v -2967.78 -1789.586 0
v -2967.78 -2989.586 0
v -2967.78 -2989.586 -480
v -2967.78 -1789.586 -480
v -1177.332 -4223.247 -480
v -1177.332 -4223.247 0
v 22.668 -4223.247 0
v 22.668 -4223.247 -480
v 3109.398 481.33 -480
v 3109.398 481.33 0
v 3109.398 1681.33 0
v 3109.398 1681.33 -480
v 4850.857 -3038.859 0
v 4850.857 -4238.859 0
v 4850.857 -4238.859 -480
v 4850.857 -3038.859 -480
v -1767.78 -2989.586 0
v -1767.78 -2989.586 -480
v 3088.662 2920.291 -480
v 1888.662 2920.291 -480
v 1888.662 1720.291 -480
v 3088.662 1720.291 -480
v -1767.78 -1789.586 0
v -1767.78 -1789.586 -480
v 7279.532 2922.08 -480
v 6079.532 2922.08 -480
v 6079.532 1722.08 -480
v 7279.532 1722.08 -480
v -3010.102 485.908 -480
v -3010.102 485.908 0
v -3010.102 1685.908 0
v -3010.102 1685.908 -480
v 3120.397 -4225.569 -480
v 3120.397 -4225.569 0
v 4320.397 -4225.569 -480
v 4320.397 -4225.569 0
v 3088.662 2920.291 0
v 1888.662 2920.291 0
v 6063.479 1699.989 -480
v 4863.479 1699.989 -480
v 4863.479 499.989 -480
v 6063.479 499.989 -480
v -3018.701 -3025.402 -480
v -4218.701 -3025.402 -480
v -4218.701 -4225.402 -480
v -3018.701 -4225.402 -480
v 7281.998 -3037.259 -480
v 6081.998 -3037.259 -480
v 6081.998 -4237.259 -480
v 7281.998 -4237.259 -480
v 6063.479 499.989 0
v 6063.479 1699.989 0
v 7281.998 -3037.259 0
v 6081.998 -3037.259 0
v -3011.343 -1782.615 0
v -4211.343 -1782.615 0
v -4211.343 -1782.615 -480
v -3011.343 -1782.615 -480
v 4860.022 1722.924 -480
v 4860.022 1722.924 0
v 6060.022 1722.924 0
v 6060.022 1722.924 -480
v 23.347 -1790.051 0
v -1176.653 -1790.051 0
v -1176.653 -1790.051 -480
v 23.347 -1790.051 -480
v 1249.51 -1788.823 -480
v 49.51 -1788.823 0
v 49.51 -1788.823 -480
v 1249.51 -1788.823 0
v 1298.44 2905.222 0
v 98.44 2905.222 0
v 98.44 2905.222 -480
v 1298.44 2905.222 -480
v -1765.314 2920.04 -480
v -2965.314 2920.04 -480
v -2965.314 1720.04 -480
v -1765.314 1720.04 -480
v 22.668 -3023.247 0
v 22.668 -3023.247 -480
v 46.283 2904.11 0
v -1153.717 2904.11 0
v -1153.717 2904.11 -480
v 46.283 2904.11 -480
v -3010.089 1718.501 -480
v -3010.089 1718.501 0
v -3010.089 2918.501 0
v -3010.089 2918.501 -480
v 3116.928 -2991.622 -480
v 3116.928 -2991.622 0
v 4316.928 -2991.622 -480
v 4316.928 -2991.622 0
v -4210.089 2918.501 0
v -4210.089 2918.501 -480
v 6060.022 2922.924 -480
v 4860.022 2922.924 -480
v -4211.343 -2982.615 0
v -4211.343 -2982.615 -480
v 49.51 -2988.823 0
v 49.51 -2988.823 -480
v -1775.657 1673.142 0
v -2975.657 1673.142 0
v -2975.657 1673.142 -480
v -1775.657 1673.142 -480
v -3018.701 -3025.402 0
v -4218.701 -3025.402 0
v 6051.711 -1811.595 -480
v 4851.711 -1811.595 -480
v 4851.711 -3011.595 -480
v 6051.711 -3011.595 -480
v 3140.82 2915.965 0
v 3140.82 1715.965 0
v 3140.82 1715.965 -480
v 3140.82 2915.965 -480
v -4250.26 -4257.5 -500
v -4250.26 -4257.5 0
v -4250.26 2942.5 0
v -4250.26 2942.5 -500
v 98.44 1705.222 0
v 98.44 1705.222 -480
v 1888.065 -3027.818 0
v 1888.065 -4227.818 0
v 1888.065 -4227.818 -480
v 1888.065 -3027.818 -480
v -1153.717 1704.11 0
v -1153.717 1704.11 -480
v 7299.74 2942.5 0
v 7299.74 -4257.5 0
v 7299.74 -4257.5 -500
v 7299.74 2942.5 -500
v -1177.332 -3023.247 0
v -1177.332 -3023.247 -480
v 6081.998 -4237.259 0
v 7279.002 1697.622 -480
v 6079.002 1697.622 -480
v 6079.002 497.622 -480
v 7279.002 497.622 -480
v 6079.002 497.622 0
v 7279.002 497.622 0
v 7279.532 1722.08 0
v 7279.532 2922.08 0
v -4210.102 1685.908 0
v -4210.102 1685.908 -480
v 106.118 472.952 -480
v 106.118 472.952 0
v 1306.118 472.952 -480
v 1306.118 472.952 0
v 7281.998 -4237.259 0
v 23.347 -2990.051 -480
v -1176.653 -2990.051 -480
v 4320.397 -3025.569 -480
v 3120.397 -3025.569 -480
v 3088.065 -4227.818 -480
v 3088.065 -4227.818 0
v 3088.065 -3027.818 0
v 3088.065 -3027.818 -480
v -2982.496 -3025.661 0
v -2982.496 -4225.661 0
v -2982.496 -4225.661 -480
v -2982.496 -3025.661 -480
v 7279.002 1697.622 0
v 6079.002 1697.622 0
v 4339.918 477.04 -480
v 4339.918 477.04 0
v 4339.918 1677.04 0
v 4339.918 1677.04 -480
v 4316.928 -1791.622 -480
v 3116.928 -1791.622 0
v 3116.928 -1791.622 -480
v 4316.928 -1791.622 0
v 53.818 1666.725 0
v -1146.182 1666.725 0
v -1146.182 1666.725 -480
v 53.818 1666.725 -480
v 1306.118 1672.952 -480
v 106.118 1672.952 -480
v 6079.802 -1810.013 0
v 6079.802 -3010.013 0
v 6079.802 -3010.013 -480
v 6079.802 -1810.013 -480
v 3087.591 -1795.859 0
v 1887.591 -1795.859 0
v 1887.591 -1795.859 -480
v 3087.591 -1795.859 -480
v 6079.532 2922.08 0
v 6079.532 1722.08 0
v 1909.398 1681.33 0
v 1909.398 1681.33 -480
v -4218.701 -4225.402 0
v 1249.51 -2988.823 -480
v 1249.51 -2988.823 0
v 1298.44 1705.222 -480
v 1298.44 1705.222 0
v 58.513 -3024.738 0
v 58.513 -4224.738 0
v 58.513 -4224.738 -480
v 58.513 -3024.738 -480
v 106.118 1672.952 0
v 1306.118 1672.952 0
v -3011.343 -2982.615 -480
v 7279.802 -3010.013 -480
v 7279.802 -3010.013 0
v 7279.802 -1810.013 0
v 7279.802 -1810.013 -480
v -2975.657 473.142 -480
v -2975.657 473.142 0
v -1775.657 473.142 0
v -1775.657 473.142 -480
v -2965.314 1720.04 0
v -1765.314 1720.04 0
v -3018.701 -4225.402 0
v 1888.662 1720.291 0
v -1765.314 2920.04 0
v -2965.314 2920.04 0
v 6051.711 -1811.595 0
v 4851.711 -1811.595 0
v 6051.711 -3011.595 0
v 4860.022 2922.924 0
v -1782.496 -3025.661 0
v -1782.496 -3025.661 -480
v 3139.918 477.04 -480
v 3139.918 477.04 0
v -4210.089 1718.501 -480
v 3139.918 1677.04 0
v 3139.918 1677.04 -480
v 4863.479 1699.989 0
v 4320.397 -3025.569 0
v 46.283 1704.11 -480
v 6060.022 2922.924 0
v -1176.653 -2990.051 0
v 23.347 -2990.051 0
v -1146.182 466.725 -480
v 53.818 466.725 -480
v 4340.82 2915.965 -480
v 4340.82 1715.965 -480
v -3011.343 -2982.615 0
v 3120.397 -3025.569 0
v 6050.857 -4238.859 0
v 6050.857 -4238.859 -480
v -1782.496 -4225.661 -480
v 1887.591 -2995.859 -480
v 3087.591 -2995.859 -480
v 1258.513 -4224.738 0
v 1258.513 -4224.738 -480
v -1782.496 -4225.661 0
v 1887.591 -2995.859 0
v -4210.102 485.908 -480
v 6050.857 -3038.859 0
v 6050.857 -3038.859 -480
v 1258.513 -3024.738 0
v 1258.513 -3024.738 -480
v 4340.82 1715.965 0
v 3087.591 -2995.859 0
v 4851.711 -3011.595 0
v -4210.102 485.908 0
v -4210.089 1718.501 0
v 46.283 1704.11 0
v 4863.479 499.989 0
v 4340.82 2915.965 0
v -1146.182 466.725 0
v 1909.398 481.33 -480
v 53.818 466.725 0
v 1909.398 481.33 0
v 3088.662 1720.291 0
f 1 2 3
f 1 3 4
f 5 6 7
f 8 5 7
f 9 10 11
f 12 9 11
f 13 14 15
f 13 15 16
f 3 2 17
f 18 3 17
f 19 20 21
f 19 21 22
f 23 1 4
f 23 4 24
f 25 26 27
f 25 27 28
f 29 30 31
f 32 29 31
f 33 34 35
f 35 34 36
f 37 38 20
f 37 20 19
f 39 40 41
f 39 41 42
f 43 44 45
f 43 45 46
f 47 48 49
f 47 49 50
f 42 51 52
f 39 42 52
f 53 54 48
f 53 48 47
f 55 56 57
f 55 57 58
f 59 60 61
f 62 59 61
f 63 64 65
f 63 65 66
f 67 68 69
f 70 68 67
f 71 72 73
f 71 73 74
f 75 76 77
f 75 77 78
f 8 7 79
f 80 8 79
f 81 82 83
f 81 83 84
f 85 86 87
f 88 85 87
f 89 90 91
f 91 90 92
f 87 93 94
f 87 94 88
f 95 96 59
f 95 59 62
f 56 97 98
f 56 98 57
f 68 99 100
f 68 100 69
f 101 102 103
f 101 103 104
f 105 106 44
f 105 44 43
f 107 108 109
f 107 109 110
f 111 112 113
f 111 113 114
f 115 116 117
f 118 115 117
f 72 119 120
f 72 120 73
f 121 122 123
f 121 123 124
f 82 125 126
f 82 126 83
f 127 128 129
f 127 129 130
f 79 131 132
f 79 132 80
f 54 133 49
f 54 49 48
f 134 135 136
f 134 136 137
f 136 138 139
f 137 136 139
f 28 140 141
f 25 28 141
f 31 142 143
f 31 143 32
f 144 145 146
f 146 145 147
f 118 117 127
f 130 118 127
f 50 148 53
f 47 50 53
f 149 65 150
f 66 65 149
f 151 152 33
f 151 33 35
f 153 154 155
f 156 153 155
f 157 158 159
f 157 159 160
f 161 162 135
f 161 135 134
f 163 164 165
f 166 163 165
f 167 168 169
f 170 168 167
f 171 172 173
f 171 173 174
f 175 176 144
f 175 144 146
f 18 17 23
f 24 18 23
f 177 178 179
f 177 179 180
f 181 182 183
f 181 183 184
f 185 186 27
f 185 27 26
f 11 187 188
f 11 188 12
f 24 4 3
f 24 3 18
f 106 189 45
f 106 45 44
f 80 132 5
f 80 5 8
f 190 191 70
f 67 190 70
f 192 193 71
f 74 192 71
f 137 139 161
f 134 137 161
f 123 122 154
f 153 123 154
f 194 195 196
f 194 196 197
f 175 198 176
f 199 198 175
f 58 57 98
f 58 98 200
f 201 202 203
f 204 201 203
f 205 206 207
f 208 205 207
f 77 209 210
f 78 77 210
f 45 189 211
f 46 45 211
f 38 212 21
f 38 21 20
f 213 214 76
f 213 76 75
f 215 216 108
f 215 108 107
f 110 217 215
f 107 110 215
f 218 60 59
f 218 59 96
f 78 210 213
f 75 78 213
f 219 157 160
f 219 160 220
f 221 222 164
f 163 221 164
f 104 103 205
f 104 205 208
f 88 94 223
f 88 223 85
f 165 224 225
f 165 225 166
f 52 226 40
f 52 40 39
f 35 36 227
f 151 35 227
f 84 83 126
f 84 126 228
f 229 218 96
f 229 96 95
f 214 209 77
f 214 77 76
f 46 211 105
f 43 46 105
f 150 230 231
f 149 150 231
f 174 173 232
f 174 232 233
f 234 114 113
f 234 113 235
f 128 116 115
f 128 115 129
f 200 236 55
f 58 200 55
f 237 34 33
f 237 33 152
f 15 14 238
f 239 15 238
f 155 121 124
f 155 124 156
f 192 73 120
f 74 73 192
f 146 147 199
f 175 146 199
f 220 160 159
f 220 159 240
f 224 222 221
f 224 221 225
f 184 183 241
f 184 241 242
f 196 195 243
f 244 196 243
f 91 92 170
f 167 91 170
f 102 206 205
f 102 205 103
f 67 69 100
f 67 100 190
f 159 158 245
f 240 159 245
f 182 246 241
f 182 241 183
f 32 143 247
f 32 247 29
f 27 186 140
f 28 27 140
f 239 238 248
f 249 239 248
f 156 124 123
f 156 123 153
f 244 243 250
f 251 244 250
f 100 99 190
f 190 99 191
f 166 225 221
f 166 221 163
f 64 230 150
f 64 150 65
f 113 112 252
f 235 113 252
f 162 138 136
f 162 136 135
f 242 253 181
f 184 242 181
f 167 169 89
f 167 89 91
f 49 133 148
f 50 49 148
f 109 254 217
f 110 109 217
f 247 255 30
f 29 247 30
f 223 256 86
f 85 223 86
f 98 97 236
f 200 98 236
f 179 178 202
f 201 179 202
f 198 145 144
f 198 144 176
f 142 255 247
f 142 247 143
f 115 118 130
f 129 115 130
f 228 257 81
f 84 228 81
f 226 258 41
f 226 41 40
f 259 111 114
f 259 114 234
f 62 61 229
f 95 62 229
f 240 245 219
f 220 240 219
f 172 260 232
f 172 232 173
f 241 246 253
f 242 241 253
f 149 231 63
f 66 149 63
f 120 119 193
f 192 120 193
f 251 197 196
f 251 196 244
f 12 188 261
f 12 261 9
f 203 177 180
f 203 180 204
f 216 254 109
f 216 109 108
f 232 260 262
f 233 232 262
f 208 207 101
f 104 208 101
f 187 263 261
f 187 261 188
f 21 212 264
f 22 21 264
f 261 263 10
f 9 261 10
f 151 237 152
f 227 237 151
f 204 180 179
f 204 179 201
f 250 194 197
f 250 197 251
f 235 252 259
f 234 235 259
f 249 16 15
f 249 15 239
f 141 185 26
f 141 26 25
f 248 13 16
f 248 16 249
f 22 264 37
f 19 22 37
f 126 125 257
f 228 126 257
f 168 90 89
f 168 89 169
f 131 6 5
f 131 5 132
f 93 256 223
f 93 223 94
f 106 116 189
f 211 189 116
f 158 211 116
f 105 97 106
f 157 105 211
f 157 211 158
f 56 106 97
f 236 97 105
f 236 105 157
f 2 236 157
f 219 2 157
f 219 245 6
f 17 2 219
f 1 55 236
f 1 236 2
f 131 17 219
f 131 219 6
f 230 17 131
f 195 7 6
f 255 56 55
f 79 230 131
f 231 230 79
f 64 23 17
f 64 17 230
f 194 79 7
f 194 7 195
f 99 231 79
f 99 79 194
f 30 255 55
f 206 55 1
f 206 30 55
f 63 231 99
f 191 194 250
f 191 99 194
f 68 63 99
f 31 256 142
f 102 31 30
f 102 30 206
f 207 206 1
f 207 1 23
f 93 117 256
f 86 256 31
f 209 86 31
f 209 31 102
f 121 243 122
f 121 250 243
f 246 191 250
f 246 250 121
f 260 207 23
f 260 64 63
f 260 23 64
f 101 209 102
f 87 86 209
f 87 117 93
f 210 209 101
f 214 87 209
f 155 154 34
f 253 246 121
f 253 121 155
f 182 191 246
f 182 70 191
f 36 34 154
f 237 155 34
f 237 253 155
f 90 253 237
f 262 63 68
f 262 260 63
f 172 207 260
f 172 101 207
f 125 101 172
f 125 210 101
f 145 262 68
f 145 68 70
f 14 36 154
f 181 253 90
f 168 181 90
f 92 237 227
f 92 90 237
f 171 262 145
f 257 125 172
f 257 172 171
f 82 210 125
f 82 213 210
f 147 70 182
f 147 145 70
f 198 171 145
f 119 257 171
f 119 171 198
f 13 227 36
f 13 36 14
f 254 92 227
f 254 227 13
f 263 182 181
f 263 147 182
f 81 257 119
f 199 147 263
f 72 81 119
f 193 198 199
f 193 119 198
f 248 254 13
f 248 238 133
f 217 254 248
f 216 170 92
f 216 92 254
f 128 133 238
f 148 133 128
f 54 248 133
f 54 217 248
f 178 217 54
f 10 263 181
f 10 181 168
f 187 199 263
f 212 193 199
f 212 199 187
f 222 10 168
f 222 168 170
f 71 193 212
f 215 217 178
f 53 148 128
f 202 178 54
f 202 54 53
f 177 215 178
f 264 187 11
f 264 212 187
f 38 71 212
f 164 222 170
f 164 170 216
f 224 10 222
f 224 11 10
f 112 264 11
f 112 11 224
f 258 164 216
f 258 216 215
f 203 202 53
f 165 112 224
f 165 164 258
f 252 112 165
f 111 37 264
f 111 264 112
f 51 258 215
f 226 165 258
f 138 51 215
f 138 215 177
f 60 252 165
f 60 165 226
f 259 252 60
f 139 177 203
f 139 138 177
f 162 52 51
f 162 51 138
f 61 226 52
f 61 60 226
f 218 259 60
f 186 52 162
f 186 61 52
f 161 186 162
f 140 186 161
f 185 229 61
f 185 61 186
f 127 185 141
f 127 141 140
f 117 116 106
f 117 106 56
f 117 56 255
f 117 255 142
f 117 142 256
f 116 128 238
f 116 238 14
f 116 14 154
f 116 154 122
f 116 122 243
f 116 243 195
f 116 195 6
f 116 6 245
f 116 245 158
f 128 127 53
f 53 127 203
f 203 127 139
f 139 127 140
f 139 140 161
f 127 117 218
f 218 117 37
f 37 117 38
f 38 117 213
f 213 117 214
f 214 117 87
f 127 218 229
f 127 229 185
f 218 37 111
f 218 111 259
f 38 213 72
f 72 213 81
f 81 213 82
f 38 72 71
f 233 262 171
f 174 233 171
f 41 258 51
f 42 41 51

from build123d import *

# Parameters (mm, degrees)
F0_W      = 11550
F0_H      = 7200
F1_DEPTH  = 500
F2_W      = 1200
F2_H      = 1200
F3_DEPTH  = 480
F4_W      = 1200
F4_H      = 1200
F5_DEPTH  = 480
F6_W      = 1200
F6_H      = 1200
F7_DEPTH  = 480
F8_W      = 1200
F8_H      = 1200
F9_DEPTH  = 480
F10_W     = 1200
F10_H     = 1200
F11_DEPTH = 480
F12_W     = 1200
F12_H     = 1200
F13_DEPTH = 480
F14_W     = 1200
F14_H     = 1200
F15_DEPTH = 480
F16_W     = 1200
F16_H     = 1200
F17_DEPTH = 480
F18_W     = 1200
F18_H     = 1200
F19_DEPTH = 480
F20_W     = 1200
F20_H     = 1200
F21_DEPTH = 480
F22_W     = 1200
F22_H     = 1200
F23_DEPTH = 480
F24_W     = 1200
F24_H     = 1200
F25_DEPTH = 480
F26_W     = 1200
F26_H     = 1200
F27_DEPTH = 480
F28_W     = 1200
F28_H     = 1200
F29_DEPTH = 480
F30_W     = 1200
F30_H     = 1200
F31_DEPTH = 480
F32_W     = 1200
F32_H     = 1200
F33_DEPTH = 480
F34_W     = 1200
F34_H     = 1200
F35_DEPTH = 480
F36_W     = 1200
F36_H     = 1200
F37_DEPTH = 480
F38_W     = 1200
F38_H     = 1200
F39_DEPTH = 480
F40_W     = 1200
F40_H     = 1200
F41_DEPTH = 480
F42_W     = 1200
F42_H     = 1200
F43_DEPTH = 480
F44_W     = 1200
F44_H     = 1200
F45_DEPTH = 480
F46_W     = 1200
F46_H     = 1200
F47_DEPTH = 480
F48_W     = 1200
F48_H     = 1200
F49_DEPTH = 480
F50_W     = 1200
F50_H     = 1200
F51_DEPTH = 480
F52_W     = 1200
F52_H     = 1200
F53_DEPTH = 480
F54_W     = 1200
F54_H     = 1200
F55_DEPTH = 480
F56_W     = 1200
F56_H     = 1200
F57_DEPTH = 480
F58_W     = 1200
F58_H     = 1200
F59_DEPTH = 480
F60_W     = 1200
F60_H     = 1200
F61_DEPTH = 480
F62_W     = 1200
F62_H     = 1200
F63_DEPTH = 480
F64_W     = 1200
F64_H     = 1200
F65_DEPTH = 480


with BuildPart() as f1:
    # F0 (on Top) → F1 (new body)
    with BuildSketch(Plane.XY):
        with Locations((1524.740228, -657.499954)):
            Rectangle(F0_W, F0_H)
    extrude(amount=-F1_DEPTH)

    # F2 (on Top) → F3 (cut)
    with BuildSketch(Plane.XY):
        with Locations((-3610.088944, 2318.501111)):
            Rectangle(F2_W, F2_H)
    extrude(amount=-F3_DEPTH, mode=Mode.SUBTRACT)

    # F4 (on Top) → F5 (cut)
    with BuildSketch(Plane.XY):
        with Locations((-2365.314484, 2320.040209)):
            Rectangle(F4_W, F4_H)
    extrude(amount=-F5_DEPTH, mode=Mode.SUBTRACT)

    # F6 (on Top) → F7 (cut)
    with BuildSketch(Plane.XY):
        with Locations((-3610.101614, 1085.907519)):
            Rectangle(F6_W, F6_H)
    extrude(amount=-F7_DEPTH, mode=Mode.SUBTRACT)

    # F8 (on Top) → F9 (cut)
    with BuildSketch(Plane.XY):
        with Locations((-2375.65726, 1073.141722)):
            Rectangle(F8_W, F8_H)
    extrude(amount=-F9_DEPTH, mode=Mode.SUBTRACT)

    # F10 (on Top) → F11 (cut)
    with BuildSketch(Plane.XY):
        with Locations((-3618.7011, -3625.402108)):
            Rectangle(F10_W, F10_H)
    extrude(amount=-F11_DEPTH, mode=Mode.SUBTRACT)

    # F12 (on Top) → F13 (cut)
    with BuildSketch(Plane.XY):
        with Locations((-3611.342549, -2382.615124)):
            Rectangle(F12_W, F12_H)
    extrude(amount=-F13_DEPTH, mode=Mode.SUBTRACT)

    # F14 (on Top) → F15 (cut)
    with BuildSketch(Plane.XY):
        with Locations((-2367.779791, -2389.58588)):
            Rectangle(F14_W, F14_H)
    extrude(amount=-F15_DEPTH, mode=Mode.SUBTRACT)

    # F16 (on Top) → F17 (cut)
    with BuildSketch(Plane.XY):
        with Locations((-2382.496297, -3625.661176)):
            Rectangle(F16_W, F16_H)
    extrude(amount=-F17_DEPTH, mode=Mode.SUBTRACT)

    # F18 (on Top) → F19 (cut)
    with BuildSketch(Plane.XY):
        with Locations((6679.53229, 2322.080213)):
            Rectangle(F18_W, F18_H)
    extrude(amount=-F19_DEPTH, mode=Mode.SUBTRACT)

    # F20 (on Top) → F21 (cut)
    with BuildSketch(Plane.XY):
        with Locations((5460.022211, 2322.924475)):
            Rectangle(F20_W, F20_H)
    extrude(amount=-F21_DEPTH, mode=Mode.SUBTRACT)

    # F22 (on Top) → F23 (cut)
    with BuildSketch(Plane.XY):
        with Locations((5463.478565, 1099.988848)):
            Rectangle(F22_W, F22_H)
    extrude(amount=-F23_DEPTH, mode=Mode.SUBTRACT)

    # F24 (on Top) → F25 (cut)
    with BuildSketch(Plane.XY):
        with Locations((6679.00184, 1097.62156)):
            Rectangle(F24_W, F24_H)
    extrude(amount=-F25_DEPTH, mode=Mode.SUBTRACT)

    # F26 (on Top) → F27 (cut)
    with BuildSketch(Plane.XY):
        with Locations((6681.997538, -3637.25922)):
            Rectangle(F26_W, F26_H)
    extrude(amount=-F27_DEPTH, mode=Mode.SUBTRACT)

    # F28 (on Top) → F29 (cut)
    with BuildSketch(Plane.XY):
        with Locations((6679.802414, -2410.012782)):
            Rectangle(F28_W, F28_H)
    extrude(amount=-F29_DEPTH, mode=Mode.SUBTRACT)

    # F30 (on Top) → F31 (cut)
    with BuildSketch(Plane.XY):
        with Locations((5451.711178, -2411.595209)):
            Rectangle(F30_W, F30_H)
    extrude(amount=-F31_DEPTH, mode=Mode.SUBTRACT)

    # F32 (on Top) → F33 (cut)
    with BuildSketch(Plane.XY):
        with Locations((5450.857043, -3638.858795)):
            Rectangle(F32_W, F32_H)
    extrude(amount=-F33_DEPTH, mode=Mode.SUBTRACT)

    # F34 (on Top) → F35 (cut)
    with BuildSketch(Plane.XY):
        with Locations((-553.716697, 2304.110462)):
            Rectangle(F34_W, F34_H)
    extrude(amount=-F35_DEPTH, mode=Mode.SUBTRACT)

    # F36 (on Top) → F37 (cut)
    with BuildSketch(Plane.XY):
        with Locations((-546.182074, 1066.725278)):
            Rectangle(F36_W, F36_H)
    extrude(amount=-F37_DEPTH, mode=Mode.SUBTRACT)

    # F38 (on Top) → F39 (cut)
    with BuildSketch(Plane.XY):
        with Locations((706.118032, 1072.951901)):
            Rectangle(F38_W, F38_H)
    extrude(amount=-F39_DEPTH, mode=Mode.SUBTRACT)

    # F40 (on Top) → F41 (cut)
    with BuildSketch(Plane.XY):
        with Locations((698.439906, 2305.221796)):
            Rectangle(F40_W, F40_H)
    extrude(amount=-F41_DEPTH, mode=Mode.SUBTRACT)

    # F42 (on Top) → F43 (cut)
    with BuildSketch(Plane.XY):
        with Locations((2488.661938, 2320.291221)):
            Rectangle(F42_W, F42_H)
    extrude(amount=-F43_DEPTH, mode=Mode.SUBTRACT)

    # F44 (on Top) → F45 (cut)
    with BuildSketch(Plane.XY):
        with Locations((2509.397545, 1081.330076)):
            Rectangle(F44_W, F44_H)
    extrude(amount=-F45_DEPTH, mode=Mode.SUBTRACT)

    # F46 (on Top) → F47 (cut)
    with BuildSketch(Plane.XY):
        with Locations((3740.82003, 2315.965354)):
            Rectangle(F46_W, F46_H)
    extrude(amount=-F47_DEPTH, mode=Mode.SUBTRACT)

    # F48 (on Top) → F49 (cut)
    with BuildSketch(Plane.XY):
        with Locations((3739.91824, 1077.040359)):
            Rectangle(F48_W, F48_H)
    extrude(amount=-F49_DEPTH, mode=Mode.SUBTRACT)

    # F50 (on Top) → F51 (cut)
    with BuildSketch(Plane.XY):
        with Locations((-576.653138, -2390.051168)):
            Rectangle(F50_W, F50_H)
    extrude(amount=-F51_DEPTH, mode=Mode.SUBTRACT)

    # F52 (on Top) → F53 (cut)
    with BuildSketch(Plane.XY):
        with Locations((-577.332392, -3623.246563)):
            Rectangle(F52_W, F52_H)
    extrude(amount=-F53_DEPTH, mode=Mode.SUBTRACT)

    # F54 (on Top) → F55 (cut)
    with BuildSketch(Plane.XY):
        with Locations((649.510191, -2388.823032)):
            Rectangle(F54_W, F54_H)
    extrude(amount=-F55_DEPTH, mode=Mode.SUBTRACT)

    # F56 (on Top) → F57 (cut)
    with BuildSketch(Plane.XY):
        with Locations((658.512962, -3624.73762)):
            Rectangle(F56_W, F56_H)
    extrude(amount=-F57_DEPTH, mode=Mode.SUBTRACT)

    # F58 (on Top) → F59 (cut)
    with BuildSketch(Plane.XY):
        with Locations((2487.591028, -2395.85931)):
            Rectangle(F58_W, F58_H)
    extrude(amount=-F59_DEPTH, mode=Mode.SUBTRACT)

    # F60 (on Top) → F61 (cut)
    with BuildSketch(Plane.XY):
        with Locations((2488.064765, -3627.817988)):
            Rectangle(F60_W, F60_H)
    extrude(amount=-F61_DEPTH, mode=Mode.SUBTRACT)

    # F62 (on Top) → F63 (cut)
    with BuildSketch(Plane.XY):
        with Locations((3716.927897, -2391.622365)):
            Rectangle(F62_W, F62_H)
    extrude(amount=-F63_DEPTH, mode=Mode.SUBTRACT)

    # F64 (on Top) → F65 (cut)
    with BuildSketch(Plane.XY):
        with Locations((3720.396776, -3625.568748)):
            Rectangle(F64_W, F64_H)
    extrude(amount=-F65_DEPTH, mode=Mode.SUBTRACT)


solid = f1.part
